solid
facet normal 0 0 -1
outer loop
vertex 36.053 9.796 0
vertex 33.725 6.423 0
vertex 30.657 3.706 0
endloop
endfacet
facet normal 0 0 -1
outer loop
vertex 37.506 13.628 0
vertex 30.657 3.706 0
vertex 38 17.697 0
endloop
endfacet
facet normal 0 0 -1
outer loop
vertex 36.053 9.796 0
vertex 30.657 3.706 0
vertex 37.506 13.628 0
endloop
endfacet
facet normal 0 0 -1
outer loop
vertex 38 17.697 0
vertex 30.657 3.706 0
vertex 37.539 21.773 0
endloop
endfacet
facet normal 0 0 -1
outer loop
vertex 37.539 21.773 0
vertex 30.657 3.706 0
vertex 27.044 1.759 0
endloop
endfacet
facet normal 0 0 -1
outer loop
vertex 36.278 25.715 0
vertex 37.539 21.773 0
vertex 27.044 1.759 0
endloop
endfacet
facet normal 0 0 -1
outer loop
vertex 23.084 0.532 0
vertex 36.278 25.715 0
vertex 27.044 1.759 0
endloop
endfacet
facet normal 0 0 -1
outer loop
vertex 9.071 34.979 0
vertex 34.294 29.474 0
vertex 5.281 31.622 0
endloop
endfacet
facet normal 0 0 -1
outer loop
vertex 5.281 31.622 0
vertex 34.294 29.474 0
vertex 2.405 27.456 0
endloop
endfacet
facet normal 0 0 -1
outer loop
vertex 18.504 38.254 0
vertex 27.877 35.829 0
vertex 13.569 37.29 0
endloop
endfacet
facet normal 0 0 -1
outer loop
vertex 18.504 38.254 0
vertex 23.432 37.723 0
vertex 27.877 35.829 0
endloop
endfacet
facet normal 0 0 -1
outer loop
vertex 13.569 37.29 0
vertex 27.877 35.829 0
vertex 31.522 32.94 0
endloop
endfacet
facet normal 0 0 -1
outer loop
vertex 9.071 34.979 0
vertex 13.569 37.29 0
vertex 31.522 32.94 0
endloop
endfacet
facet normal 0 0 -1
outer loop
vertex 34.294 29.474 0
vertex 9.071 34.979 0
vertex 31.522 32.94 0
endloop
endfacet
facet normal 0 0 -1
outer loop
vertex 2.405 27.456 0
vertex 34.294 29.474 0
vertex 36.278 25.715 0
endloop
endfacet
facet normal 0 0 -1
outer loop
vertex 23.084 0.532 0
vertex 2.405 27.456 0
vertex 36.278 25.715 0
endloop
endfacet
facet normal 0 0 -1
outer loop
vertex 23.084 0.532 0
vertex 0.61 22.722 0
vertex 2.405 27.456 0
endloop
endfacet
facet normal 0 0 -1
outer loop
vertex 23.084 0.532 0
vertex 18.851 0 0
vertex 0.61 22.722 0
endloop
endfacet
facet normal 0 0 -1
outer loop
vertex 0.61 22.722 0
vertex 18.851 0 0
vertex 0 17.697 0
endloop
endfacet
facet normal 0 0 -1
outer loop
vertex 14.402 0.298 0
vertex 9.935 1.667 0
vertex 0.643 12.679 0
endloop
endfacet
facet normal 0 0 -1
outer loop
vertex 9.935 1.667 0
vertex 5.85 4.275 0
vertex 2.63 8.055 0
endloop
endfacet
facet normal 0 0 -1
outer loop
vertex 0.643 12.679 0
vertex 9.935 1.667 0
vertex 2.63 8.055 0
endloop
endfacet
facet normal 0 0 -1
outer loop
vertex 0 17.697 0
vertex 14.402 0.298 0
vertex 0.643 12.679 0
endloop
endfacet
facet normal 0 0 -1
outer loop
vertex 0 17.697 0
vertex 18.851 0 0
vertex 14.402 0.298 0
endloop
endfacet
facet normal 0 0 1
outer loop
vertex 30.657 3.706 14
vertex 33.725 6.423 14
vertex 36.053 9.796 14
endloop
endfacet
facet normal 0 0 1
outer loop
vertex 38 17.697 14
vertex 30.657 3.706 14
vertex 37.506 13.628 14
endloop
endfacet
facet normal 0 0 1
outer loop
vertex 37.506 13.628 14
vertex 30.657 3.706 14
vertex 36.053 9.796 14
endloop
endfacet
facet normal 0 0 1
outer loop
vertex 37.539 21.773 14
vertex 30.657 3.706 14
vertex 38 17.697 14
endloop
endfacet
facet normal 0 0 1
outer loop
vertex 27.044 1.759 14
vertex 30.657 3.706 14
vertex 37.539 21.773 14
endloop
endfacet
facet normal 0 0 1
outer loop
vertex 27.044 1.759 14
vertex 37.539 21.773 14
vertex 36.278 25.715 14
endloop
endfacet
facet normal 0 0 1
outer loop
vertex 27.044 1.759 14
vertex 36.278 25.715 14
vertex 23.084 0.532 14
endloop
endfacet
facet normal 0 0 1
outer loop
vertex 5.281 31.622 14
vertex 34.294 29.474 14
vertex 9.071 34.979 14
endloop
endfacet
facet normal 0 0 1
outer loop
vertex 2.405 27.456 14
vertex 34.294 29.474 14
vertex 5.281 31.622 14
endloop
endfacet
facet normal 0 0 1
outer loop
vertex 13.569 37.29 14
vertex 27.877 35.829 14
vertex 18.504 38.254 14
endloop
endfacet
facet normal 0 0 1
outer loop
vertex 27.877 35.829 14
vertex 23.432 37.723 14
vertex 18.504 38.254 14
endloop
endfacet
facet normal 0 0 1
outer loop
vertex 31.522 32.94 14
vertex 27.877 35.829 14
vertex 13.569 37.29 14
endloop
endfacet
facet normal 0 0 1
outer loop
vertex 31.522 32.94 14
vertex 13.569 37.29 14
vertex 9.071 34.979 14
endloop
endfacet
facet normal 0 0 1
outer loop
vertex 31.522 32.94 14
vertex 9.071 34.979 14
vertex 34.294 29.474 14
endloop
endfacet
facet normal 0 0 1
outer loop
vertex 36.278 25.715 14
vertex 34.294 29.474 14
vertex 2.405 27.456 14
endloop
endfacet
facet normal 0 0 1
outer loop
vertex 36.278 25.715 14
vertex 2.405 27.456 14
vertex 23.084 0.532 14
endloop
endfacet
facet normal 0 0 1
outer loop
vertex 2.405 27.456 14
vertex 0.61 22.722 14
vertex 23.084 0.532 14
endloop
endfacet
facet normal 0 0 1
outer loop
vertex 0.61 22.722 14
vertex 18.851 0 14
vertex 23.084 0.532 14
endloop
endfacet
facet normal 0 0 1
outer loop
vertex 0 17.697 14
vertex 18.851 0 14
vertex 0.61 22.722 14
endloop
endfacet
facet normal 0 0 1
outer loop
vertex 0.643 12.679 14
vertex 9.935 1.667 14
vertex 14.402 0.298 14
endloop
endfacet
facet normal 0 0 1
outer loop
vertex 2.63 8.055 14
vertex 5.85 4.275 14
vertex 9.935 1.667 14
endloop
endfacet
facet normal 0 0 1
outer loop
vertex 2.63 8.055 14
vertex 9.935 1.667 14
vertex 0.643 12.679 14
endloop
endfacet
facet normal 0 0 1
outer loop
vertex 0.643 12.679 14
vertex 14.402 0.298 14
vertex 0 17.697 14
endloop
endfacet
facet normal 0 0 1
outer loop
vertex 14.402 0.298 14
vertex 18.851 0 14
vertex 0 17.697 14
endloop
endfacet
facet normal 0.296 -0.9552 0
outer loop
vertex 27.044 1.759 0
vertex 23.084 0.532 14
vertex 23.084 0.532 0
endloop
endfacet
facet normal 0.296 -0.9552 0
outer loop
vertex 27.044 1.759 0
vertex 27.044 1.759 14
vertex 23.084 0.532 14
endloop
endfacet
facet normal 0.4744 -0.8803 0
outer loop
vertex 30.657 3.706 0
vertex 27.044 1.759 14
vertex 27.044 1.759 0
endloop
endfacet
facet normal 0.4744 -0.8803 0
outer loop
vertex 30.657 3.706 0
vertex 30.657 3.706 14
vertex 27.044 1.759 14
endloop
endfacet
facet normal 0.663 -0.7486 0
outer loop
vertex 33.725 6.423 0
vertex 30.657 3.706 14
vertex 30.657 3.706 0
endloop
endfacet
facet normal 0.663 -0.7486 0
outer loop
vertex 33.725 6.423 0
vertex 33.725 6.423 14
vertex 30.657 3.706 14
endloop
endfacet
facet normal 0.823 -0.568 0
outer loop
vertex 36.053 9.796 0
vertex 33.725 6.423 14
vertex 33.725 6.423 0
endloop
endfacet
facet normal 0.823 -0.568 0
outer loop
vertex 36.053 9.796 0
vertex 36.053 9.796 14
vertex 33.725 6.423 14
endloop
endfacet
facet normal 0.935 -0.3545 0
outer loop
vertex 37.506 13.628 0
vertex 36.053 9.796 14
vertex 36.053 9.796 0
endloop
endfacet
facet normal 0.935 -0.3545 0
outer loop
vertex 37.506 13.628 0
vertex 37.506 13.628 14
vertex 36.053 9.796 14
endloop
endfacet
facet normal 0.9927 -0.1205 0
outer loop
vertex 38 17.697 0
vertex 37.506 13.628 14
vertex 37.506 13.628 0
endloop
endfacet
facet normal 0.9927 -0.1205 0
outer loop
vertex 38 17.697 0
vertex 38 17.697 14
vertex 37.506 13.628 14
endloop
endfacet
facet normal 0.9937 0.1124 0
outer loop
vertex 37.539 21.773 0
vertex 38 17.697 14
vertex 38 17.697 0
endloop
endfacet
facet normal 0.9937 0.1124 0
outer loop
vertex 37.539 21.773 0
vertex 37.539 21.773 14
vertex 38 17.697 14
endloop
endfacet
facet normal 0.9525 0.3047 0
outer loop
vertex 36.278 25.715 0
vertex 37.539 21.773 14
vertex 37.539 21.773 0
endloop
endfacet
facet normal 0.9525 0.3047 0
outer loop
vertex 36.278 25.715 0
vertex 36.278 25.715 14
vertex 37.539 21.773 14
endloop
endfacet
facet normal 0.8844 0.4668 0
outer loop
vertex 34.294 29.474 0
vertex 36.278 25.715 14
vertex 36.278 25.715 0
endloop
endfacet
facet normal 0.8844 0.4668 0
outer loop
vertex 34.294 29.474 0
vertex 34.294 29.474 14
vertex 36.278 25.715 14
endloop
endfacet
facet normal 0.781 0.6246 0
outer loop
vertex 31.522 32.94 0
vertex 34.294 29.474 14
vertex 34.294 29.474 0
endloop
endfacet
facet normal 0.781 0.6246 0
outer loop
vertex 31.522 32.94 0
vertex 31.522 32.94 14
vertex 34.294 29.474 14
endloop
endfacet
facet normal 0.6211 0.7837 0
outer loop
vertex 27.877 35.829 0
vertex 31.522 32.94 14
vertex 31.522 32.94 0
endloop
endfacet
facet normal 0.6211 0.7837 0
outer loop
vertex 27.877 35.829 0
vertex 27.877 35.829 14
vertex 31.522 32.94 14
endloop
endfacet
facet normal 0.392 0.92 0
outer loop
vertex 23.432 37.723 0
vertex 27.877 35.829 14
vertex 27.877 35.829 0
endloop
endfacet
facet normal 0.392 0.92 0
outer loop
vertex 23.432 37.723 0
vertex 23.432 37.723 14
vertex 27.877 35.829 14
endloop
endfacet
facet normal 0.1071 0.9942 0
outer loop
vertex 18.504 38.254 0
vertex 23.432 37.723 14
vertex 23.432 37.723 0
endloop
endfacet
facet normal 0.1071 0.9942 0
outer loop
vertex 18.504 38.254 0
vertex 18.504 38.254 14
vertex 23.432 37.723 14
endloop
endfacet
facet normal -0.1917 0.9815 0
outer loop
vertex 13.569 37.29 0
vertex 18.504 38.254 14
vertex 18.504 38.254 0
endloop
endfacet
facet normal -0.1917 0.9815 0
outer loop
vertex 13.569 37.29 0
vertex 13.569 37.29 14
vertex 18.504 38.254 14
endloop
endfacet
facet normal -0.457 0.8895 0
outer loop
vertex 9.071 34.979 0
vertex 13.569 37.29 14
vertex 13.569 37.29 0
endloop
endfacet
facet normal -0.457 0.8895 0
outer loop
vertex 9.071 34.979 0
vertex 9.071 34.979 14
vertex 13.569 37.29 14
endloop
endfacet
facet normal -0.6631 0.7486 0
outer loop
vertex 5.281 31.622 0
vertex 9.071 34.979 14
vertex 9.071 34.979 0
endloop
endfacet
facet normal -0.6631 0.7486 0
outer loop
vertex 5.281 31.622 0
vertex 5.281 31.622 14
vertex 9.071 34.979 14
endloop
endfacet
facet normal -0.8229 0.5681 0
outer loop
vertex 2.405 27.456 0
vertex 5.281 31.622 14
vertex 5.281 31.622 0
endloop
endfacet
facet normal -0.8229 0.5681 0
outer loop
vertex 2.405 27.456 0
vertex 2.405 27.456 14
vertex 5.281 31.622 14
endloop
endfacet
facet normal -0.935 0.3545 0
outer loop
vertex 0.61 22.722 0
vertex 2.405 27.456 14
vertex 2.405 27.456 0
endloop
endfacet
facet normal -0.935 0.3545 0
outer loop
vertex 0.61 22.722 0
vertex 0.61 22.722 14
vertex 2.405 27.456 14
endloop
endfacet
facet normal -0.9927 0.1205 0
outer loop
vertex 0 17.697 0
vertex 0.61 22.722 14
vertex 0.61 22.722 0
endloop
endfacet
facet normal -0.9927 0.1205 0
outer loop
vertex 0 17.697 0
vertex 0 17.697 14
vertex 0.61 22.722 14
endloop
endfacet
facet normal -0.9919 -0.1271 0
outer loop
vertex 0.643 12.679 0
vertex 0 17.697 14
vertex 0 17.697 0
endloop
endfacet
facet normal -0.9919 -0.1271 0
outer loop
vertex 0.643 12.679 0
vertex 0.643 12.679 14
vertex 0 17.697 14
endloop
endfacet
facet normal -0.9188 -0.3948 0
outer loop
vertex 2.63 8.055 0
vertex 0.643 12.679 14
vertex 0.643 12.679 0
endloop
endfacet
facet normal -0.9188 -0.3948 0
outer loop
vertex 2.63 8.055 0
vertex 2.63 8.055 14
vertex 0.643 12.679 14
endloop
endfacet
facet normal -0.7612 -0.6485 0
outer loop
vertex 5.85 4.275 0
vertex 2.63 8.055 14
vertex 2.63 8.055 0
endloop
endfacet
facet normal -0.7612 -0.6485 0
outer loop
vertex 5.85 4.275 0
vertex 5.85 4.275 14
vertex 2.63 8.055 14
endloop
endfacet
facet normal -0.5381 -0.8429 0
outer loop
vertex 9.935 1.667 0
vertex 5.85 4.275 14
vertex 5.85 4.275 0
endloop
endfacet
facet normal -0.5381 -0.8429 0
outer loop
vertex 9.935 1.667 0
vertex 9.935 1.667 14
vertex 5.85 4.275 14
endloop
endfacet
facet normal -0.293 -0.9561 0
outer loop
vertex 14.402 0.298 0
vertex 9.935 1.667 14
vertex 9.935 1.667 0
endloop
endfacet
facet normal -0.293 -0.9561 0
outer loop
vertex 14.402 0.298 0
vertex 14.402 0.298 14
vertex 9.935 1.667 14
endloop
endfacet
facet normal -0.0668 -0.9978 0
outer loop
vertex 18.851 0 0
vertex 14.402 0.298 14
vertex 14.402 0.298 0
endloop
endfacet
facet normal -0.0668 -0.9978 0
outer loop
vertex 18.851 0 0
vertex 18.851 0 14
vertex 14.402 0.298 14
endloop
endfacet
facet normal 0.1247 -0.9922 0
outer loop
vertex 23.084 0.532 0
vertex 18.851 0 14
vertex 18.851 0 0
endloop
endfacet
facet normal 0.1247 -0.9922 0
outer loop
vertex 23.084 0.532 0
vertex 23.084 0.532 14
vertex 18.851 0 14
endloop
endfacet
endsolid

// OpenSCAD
$fn = 32;

// ----------------------------------------------------------------------
// Cam disc: base radius 17.0 mm, lift 4.0 mm, 26 profile points
// ----------------------------------------------------------------------

// --- parameters (mm) ---
profile_height = 14;      // extrusion height
profile_points = 26;      // points of the closed outline

profile = [[38, 17.697], [37.539, 21.773], [36.278, 25.715], [34.294, 29.474], [31.522, 32.94], [27.877, 35.829], [23.432, 37.723], [18.504, 38.254], [13.569, 37.29], [9.071, 34.979], [5.281, 31.622], [2.405, 27.456], [0.61, 22.722], [0, 17.697], [0.643, 12.679], [2.63, 8.055], [5.85, 4.275], [9.935, 1.667], [14.402, 0.298], [18.851, 0], [23.084, 0.532], [27.044, 1.759], [30.657, 3.706], [33.725, 6.423], [36.053, 9.796], [37.506, 13.628]];  // single closed polygon, 26 points, counter clockwise

// --- the one profile operation ---
linear_extrude(height = profile_height) polygon(points = profile);
